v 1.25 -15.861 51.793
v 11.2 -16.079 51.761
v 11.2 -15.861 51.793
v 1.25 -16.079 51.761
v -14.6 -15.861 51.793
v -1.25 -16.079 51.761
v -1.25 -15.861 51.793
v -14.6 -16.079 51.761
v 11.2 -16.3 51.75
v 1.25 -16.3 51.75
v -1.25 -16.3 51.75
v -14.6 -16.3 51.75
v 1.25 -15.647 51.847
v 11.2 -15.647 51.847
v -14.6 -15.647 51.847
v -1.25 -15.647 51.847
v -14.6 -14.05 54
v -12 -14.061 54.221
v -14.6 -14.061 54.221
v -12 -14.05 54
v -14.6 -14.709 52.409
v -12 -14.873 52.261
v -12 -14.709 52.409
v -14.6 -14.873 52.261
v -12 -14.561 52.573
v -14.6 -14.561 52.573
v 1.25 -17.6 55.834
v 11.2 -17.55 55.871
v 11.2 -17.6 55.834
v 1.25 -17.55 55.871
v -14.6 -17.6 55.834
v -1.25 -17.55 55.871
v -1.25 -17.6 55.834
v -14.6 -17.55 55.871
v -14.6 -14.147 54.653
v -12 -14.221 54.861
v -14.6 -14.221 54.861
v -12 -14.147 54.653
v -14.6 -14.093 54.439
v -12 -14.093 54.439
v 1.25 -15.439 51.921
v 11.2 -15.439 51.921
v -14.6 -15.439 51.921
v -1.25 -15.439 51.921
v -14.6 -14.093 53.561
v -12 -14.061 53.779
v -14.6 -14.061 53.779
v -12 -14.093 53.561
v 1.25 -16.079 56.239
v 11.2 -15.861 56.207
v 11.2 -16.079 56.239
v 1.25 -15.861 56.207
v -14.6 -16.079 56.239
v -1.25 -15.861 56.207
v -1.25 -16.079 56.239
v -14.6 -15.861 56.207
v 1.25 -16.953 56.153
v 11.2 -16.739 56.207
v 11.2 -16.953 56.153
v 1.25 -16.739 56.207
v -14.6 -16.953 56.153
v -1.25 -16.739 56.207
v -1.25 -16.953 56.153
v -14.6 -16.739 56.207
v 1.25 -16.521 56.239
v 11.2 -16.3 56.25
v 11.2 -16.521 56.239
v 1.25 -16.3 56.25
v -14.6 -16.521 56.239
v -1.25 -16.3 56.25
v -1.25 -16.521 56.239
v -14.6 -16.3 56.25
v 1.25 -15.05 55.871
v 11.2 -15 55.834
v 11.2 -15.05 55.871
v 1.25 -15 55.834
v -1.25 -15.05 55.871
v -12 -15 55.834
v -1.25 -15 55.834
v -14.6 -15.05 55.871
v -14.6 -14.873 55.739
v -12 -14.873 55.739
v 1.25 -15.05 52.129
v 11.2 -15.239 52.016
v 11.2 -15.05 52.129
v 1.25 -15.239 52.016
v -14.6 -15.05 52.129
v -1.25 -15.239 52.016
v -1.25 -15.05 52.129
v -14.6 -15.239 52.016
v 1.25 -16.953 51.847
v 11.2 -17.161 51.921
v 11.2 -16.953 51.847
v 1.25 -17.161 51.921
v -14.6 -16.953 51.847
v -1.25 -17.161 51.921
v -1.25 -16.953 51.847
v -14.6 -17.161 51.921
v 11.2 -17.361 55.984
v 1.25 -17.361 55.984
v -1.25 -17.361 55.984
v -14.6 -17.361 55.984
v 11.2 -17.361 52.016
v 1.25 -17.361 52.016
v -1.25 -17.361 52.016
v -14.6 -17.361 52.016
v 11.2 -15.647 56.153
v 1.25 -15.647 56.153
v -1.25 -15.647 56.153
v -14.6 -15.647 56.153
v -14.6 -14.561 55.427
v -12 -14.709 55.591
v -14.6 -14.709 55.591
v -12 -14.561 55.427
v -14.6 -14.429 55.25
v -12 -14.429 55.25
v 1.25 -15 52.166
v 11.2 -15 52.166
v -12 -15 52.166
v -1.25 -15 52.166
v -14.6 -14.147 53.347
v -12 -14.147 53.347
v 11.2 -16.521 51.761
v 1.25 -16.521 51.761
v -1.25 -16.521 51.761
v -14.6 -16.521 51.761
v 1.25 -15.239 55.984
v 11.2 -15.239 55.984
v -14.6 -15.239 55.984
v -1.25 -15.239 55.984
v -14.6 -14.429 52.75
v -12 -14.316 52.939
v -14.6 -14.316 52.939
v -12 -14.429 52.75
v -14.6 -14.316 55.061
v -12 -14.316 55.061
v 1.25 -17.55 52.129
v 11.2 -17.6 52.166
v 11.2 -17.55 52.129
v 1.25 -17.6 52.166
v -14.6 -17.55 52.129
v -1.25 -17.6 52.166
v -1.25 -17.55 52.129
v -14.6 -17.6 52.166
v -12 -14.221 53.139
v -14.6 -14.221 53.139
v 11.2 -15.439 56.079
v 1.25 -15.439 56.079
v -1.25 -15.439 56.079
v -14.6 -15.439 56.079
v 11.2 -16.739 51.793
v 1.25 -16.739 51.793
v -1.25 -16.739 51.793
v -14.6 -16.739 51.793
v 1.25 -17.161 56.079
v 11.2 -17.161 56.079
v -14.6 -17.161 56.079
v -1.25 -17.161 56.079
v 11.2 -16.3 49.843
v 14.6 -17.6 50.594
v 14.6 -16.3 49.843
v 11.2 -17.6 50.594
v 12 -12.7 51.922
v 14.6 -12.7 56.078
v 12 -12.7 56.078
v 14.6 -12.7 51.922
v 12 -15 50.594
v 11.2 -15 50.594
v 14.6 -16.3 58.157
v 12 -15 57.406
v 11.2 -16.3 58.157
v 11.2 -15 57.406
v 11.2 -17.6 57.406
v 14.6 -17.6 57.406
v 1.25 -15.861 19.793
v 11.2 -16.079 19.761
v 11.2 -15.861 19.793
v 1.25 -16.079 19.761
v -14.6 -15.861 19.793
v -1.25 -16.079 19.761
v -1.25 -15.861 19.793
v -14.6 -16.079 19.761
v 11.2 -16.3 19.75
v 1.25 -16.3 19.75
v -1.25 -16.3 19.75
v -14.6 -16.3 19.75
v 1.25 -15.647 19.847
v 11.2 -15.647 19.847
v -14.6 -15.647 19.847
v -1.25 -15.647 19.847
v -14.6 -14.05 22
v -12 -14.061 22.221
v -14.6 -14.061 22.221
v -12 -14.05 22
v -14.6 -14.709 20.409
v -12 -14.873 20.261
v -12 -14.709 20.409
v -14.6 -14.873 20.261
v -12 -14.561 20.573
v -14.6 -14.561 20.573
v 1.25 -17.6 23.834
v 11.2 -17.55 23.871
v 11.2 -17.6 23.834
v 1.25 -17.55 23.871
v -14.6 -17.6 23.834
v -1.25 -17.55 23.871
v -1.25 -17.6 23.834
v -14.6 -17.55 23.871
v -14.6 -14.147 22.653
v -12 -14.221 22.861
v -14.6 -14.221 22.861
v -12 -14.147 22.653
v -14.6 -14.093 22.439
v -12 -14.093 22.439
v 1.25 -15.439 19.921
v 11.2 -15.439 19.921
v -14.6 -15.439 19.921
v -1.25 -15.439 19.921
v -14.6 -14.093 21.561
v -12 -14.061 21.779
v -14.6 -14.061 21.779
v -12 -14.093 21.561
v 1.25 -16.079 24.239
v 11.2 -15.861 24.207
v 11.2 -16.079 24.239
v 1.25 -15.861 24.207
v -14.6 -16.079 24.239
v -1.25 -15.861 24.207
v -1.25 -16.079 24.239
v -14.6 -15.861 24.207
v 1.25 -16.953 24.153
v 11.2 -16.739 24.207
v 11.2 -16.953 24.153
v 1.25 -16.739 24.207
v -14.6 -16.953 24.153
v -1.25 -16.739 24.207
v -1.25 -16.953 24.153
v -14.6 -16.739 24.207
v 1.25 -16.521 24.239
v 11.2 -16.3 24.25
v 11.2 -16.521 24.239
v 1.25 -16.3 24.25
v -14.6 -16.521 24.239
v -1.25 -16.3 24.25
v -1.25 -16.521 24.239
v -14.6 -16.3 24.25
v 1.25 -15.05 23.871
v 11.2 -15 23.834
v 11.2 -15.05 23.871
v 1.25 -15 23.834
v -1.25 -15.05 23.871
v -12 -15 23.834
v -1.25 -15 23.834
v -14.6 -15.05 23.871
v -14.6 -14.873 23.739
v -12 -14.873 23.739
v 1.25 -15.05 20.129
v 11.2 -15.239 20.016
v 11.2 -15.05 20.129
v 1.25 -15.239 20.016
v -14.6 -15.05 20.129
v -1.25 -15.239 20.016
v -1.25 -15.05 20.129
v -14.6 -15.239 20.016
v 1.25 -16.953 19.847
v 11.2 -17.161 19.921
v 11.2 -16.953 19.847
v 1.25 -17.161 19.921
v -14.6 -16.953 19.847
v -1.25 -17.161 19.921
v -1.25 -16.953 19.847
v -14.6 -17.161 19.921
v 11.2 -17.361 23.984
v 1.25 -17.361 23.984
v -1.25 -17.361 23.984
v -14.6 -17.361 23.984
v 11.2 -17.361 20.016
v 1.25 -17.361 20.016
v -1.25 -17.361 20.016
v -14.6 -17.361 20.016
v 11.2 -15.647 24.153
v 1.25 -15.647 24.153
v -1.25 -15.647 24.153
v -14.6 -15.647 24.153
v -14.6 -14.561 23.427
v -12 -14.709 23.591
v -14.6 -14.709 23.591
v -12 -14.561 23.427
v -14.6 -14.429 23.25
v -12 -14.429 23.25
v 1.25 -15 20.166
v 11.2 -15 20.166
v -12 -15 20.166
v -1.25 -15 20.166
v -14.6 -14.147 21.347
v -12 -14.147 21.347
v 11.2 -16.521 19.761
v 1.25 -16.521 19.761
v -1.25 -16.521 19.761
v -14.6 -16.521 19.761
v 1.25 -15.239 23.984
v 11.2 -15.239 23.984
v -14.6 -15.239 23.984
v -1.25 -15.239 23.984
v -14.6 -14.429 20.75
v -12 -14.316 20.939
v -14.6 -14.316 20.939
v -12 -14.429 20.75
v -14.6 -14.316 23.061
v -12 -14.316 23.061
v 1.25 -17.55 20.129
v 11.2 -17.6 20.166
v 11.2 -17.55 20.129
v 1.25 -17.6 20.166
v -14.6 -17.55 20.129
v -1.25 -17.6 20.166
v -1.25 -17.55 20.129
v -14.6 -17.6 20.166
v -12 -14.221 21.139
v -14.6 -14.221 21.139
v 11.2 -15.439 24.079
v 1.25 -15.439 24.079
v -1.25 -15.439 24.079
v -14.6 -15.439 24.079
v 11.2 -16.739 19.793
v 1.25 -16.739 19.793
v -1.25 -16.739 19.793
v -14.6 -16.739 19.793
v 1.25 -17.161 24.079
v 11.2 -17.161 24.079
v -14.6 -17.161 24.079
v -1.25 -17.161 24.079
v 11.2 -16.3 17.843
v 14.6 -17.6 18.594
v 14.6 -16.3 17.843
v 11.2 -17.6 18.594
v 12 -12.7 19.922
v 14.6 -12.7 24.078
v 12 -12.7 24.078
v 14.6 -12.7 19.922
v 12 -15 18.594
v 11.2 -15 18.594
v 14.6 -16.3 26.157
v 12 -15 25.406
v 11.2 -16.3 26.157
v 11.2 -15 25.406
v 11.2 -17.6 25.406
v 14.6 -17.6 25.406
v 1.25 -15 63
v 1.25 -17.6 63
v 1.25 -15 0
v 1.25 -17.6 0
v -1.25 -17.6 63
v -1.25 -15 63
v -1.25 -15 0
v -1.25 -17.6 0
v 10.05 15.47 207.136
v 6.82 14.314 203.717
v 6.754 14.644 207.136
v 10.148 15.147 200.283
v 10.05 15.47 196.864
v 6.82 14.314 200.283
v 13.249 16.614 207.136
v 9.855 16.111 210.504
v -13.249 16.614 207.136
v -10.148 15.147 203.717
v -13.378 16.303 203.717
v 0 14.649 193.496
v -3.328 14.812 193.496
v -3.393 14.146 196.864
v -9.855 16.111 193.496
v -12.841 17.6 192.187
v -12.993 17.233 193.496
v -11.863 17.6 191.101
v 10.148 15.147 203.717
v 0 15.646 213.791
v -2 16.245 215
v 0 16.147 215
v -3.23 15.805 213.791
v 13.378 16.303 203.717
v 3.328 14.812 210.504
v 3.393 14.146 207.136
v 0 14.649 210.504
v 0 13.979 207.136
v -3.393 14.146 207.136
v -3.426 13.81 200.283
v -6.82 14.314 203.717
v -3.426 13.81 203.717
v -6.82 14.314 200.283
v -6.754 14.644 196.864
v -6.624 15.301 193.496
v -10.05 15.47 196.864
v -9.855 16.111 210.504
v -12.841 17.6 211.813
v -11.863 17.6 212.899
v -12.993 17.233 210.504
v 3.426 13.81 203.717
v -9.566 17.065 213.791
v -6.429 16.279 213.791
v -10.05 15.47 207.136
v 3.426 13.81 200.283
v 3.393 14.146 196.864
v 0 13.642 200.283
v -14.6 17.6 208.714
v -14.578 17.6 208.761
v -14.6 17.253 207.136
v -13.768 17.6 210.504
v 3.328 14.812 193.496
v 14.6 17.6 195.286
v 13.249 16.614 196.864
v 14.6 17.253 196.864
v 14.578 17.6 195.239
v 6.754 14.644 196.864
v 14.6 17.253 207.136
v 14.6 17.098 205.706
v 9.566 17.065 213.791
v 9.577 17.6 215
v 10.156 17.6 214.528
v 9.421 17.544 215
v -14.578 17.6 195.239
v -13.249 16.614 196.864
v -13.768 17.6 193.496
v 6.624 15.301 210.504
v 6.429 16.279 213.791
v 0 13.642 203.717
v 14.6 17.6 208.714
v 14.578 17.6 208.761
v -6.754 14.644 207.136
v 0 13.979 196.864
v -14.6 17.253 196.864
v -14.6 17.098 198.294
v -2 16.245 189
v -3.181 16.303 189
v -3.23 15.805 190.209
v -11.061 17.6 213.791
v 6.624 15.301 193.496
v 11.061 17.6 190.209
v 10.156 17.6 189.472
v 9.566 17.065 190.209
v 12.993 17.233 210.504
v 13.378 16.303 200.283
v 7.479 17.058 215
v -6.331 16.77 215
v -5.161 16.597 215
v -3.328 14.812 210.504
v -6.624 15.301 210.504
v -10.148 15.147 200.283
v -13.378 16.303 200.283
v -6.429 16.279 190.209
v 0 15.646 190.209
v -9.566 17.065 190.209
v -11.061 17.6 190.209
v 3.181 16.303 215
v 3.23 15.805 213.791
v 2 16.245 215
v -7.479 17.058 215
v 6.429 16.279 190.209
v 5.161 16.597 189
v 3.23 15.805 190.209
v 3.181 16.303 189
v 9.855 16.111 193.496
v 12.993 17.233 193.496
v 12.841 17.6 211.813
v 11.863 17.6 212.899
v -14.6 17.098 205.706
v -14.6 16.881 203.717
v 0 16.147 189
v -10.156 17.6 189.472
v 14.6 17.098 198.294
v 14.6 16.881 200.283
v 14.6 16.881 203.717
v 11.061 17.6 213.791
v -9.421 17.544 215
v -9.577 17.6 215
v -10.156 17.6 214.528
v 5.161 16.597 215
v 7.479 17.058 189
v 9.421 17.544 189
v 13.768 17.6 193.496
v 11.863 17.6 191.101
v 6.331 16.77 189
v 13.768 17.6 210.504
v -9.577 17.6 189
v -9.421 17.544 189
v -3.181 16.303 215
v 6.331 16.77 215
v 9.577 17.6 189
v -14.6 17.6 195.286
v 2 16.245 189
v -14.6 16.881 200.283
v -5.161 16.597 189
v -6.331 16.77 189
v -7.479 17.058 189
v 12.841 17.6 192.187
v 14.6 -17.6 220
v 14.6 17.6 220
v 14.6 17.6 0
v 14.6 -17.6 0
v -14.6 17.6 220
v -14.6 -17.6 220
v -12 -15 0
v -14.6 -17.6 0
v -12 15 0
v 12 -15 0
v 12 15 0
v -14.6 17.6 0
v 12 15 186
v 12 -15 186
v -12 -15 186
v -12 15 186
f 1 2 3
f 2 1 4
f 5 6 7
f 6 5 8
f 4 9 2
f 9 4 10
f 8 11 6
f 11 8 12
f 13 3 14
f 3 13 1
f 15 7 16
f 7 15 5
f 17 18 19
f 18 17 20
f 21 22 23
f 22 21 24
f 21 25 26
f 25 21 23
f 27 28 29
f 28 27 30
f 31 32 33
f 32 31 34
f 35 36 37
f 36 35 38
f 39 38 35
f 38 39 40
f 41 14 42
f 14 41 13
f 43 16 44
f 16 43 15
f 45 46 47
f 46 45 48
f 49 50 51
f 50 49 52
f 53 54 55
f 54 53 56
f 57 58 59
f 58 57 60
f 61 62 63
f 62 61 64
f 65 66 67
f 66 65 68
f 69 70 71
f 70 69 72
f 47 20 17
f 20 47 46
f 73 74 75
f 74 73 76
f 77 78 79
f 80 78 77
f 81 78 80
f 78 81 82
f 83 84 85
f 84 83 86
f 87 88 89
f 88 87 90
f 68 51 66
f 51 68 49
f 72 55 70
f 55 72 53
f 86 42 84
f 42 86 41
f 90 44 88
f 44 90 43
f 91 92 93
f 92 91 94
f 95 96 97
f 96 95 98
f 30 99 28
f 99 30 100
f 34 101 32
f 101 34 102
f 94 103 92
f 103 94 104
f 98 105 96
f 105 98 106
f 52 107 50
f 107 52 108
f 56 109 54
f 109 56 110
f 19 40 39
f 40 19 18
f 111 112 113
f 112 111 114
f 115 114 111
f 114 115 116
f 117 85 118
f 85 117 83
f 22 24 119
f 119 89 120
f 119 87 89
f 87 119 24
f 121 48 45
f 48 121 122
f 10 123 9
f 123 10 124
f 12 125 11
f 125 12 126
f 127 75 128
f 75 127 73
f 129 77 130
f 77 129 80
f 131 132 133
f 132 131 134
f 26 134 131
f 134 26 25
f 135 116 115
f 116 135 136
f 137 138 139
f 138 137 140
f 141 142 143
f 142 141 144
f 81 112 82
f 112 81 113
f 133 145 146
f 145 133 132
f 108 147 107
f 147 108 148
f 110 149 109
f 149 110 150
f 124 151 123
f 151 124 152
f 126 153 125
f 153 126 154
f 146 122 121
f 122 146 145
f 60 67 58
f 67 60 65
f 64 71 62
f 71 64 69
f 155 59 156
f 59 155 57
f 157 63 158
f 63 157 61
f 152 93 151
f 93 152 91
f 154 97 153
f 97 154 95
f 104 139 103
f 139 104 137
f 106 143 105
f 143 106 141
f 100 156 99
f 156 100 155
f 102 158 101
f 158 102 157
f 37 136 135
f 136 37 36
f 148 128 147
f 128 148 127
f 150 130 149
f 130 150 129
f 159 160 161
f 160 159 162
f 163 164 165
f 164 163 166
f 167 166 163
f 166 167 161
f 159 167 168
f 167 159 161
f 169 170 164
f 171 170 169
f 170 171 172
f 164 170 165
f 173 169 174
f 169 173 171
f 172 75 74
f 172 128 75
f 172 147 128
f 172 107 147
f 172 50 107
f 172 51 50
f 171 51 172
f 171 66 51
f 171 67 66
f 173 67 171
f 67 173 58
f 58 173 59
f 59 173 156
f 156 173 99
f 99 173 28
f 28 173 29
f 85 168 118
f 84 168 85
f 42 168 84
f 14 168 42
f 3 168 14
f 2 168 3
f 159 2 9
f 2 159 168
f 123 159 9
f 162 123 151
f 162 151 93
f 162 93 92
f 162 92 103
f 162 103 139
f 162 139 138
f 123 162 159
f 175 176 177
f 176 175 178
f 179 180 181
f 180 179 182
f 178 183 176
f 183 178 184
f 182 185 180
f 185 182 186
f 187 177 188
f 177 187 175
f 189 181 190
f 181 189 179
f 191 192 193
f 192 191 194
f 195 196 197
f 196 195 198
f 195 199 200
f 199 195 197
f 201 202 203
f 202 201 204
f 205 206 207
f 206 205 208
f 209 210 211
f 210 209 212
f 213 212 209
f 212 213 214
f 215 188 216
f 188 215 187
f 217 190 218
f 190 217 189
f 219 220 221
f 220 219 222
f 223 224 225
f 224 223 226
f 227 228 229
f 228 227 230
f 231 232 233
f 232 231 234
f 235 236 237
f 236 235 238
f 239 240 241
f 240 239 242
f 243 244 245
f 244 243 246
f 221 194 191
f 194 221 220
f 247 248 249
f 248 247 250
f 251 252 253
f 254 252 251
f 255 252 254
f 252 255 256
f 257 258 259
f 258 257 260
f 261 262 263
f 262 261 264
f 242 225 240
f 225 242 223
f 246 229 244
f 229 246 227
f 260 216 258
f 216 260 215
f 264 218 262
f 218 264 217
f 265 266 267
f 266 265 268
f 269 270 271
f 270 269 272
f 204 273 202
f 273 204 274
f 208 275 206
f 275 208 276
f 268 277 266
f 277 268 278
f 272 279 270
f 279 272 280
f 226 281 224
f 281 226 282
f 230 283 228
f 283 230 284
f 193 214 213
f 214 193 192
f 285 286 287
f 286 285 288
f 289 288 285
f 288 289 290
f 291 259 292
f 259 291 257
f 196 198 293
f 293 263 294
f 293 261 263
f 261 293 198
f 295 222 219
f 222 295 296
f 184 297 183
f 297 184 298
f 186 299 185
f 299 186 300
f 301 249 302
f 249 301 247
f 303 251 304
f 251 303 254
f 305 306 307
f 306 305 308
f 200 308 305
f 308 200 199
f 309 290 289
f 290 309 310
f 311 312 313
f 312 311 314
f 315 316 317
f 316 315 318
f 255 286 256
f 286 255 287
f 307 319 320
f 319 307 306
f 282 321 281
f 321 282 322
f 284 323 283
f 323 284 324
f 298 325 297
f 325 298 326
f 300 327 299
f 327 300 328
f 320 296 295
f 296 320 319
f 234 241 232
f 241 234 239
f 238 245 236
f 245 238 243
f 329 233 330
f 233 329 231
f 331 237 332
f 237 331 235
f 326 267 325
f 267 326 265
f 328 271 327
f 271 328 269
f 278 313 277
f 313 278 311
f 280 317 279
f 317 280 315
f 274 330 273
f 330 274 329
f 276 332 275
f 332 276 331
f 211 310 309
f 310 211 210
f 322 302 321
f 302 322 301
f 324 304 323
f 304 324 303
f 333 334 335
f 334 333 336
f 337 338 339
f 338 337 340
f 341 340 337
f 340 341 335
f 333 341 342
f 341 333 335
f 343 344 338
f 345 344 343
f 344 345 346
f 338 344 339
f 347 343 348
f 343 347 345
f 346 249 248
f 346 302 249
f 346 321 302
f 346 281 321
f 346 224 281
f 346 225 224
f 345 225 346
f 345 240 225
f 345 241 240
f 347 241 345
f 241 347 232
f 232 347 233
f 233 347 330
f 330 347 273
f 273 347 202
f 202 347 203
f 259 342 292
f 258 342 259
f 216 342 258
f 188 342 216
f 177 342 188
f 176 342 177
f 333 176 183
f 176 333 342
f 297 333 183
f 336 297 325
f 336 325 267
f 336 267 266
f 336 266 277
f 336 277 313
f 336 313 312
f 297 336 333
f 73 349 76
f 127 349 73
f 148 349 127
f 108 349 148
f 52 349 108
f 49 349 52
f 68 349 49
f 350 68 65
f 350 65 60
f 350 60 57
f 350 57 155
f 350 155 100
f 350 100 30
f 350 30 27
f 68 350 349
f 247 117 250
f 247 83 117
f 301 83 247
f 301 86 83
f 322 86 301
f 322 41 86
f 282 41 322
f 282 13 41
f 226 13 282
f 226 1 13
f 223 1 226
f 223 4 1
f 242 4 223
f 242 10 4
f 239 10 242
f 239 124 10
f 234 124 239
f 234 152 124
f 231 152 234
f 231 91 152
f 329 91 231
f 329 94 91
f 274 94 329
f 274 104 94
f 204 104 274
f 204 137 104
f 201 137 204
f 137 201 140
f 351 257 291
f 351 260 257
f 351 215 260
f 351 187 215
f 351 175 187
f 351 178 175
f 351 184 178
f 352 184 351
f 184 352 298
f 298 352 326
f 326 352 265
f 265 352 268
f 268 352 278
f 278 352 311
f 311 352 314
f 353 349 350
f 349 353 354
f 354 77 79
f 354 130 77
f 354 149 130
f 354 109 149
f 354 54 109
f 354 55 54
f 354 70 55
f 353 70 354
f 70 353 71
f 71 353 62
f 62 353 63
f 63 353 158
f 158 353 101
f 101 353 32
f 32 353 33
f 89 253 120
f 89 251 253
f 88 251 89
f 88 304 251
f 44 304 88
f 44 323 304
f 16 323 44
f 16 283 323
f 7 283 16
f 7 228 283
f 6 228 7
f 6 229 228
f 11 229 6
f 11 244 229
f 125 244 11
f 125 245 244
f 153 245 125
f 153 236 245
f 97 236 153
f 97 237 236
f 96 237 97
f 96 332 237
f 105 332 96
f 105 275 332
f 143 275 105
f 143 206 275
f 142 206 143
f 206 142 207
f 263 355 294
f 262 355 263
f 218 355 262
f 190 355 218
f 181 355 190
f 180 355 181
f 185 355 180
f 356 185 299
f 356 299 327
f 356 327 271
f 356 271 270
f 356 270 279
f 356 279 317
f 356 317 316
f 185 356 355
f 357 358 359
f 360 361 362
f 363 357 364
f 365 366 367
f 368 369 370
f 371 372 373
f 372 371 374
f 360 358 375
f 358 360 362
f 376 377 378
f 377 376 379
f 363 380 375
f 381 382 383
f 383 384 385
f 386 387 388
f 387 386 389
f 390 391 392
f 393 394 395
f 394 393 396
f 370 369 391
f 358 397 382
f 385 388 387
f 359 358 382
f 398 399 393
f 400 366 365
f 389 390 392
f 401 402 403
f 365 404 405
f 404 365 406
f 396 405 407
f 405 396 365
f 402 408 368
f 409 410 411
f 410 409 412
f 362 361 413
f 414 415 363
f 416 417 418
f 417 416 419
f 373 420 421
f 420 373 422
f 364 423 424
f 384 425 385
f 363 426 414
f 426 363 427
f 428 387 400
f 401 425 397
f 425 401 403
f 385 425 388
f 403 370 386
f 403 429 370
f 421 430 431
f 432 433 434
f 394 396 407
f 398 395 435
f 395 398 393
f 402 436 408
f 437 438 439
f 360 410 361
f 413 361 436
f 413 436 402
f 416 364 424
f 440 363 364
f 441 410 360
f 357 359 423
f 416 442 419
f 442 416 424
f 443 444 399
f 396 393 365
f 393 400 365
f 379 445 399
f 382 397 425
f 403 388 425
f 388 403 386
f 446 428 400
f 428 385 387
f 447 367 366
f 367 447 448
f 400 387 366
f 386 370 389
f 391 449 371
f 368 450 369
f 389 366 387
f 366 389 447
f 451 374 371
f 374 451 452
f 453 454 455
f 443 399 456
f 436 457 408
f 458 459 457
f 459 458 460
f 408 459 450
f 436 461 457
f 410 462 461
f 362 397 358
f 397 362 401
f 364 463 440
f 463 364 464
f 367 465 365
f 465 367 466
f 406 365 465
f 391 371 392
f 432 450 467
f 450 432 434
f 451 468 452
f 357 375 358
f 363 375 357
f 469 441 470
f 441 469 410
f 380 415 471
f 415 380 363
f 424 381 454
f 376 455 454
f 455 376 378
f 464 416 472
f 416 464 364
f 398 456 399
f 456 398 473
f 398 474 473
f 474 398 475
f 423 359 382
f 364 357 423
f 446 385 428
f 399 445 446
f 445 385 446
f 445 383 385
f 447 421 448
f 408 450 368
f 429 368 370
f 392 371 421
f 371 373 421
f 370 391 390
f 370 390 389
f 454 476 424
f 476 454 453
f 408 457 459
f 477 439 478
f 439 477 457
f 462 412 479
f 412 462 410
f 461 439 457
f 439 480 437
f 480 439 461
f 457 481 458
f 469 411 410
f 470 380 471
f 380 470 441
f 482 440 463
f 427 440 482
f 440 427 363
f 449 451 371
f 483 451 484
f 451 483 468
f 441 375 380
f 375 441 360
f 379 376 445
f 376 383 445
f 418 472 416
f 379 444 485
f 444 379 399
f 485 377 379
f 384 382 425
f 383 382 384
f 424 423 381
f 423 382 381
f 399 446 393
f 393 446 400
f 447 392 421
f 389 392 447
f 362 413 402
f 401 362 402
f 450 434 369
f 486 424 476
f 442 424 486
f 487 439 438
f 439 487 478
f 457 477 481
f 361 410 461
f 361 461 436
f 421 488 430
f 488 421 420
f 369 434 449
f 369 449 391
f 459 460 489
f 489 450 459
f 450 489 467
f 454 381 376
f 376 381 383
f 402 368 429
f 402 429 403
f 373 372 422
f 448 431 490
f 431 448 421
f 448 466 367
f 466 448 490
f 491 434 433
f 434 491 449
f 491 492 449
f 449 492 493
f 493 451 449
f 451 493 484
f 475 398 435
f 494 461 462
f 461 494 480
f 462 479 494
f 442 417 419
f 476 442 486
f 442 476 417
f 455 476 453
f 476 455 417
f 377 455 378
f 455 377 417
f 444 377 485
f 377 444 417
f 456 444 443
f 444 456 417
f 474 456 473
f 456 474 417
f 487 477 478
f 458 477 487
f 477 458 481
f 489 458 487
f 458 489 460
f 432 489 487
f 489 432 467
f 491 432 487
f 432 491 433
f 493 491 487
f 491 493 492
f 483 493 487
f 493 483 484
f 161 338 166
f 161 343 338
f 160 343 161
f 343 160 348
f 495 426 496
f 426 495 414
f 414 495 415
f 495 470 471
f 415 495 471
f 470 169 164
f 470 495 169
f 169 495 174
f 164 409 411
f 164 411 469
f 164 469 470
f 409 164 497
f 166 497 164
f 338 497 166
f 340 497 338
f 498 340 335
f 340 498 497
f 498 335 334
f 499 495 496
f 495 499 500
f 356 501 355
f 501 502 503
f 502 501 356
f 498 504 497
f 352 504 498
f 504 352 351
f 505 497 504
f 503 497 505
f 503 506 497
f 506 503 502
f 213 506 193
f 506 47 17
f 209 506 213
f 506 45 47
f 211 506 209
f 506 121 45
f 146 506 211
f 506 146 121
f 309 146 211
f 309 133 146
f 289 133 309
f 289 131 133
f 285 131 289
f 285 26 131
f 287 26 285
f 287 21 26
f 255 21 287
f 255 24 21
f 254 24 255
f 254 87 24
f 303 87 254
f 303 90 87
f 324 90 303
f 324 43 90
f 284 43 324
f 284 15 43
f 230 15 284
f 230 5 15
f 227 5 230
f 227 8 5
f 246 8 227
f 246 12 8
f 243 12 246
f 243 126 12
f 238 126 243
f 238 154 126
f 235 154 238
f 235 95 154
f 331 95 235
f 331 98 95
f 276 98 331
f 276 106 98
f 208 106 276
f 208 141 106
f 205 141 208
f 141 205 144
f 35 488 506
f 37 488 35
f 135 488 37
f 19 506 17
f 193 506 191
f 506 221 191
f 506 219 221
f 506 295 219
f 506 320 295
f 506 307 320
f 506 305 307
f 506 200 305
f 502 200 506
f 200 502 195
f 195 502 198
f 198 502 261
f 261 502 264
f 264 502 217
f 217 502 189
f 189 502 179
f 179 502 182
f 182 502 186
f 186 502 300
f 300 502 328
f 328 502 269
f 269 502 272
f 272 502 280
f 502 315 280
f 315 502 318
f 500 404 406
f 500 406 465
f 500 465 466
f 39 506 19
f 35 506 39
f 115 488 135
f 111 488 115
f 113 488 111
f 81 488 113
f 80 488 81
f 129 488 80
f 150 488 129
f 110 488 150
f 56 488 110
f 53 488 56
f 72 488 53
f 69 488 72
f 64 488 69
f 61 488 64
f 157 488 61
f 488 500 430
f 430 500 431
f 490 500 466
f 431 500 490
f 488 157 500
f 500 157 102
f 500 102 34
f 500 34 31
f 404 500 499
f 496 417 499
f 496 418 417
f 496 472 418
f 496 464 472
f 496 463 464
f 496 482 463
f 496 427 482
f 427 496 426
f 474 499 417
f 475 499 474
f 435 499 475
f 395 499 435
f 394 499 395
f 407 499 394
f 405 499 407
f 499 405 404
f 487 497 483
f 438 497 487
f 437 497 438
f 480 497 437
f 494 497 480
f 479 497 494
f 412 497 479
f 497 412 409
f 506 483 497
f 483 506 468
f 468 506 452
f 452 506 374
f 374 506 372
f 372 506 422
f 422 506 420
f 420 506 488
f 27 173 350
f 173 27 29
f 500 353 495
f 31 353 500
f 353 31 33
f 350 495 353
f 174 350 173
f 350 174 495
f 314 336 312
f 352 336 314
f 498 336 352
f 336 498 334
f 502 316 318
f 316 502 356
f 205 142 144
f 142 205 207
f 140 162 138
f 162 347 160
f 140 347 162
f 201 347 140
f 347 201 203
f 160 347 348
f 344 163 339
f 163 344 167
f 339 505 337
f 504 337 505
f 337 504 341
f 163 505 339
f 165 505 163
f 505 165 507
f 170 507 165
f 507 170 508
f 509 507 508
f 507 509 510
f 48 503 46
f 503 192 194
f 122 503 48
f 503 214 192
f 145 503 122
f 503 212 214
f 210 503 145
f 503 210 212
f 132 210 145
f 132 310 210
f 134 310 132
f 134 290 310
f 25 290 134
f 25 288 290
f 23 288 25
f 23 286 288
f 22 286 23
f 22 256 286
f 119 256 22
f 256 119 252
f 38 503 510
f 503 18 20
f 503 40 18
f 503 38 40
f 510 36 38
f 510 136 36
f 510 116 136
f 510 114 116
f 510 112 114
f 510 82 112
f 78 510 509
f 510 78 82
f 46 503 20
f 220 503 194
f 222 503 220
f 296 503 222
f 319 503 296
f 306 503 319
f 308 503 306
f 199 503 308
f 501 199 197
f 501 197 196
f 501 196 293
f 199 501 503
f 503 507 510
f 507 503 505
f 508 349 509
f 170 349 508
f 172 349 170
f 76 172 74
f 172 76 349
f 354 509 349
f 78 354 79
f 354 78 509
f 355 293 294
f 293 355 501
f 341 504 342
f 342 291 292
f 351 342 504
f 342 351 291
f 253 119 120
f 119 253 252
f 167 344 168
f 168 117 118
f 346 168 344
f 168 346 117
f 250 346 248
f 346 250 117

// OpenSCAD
// ===================================================================
// Robotiq 2F-85 finger EXTENSION SLEEVE  (slip-on, clamped)
//
// Replaces the earlier bolt-on version, which needed the pad bolt pattern --
// dimensions this project has no authoritative source for. This one slides
// OVER the existing fingertip and pinches with a single cross bolt, so it
// needs no gripper disassembly, tolerates a wrong socket guess, and comes
// straight off again.
//
// PURPOSE (unchanged)
//   1. Put the grasp point 270 mm from the flange, matching
//      throw_pose_table_ext15.npy and results_kinetic_chain_gen3_ext15{,_narrow}/1.
//      run_hardware_throw.py REFUSES a --tool_offset_z that disagrees with the
//      table stamp, so the built number has to be right.
//   2. Break the encompassing grip. Measured 2026-09-09: the bare gripper cages
//      a 67 mm tennis ball until 8.33% closed, so the ball is not free until
//      ~175-250 ms after t_r and then drops onto the gripper. The tip is a
//      SHALLOW DISH -- contact below the ball's equator, so it lifts straight
//      out. Do not deepen it.
//   3. Grip force cannot be limited in software (GRIPPER_FORCE is rejected by
//      this firmware), so the section stays deep in the closing direction.
//
// SOCKET IS OVERSIZED ON PURPOSE. Measure the fingertip, set SOCKET_W/D to
// about +1.5 mm over it, and let the clamp take up the rest. Add a strip of
// rubber inside if it is still loose.
// ===================================================================

/* [Fit -- measure the fingertip, then add ~1.5 mm] */
SOCKET_W   = 24;    // across the finger
SOCKET_D   = 30;    // along the closing direction
SOCKET_L   = 70;    // LONG ON PURPOSE: engagement is adjustable, so the exact
                    // flange-to-fingertip measurement stops being critical.
                    // Slide it on further or less and clamp anywhere over a
                    // ~25 mm range, then MEASURE the resulting grasp point and
                    // set --tool_offset_z / re-derive the pose table to match.
WALL       = 2.6;
TIP_SOLID  = 34;    // solid block at the tip that carries the dish

/* [Length] */
DISH_FROM_FLANGE = 270;  // the number the checkpoint needs, mm
FLANGE_TO_TIP    = 120;  // nominal; the long socket absorbs the error
EXTENSION  = DISH_FROM_FLANGE - FLANGE_TO_TIP;   // sleeve reach past the tip

/* [Clamp] */
SLIT_W     = 2.5;
CLAMP_D    = 4.5;   // M4 clearance
NUT_AF     = 7.2;   // M4 nut across flats
NUT_T      = 3.4;

/* [Tip] */
BALL_D     = 67;
DISH_DEPTH = 4;
DISH_R     = 35;
DISH_L     = 26;

$fn = 64;
OW = SOCKET_W + 2*WALL;
OD = SOCKET_D + 2*WALL;
TOTAL = SOCKET_L + EXTENSION;
DISH_Z = TOTAL - 18;

// STRAIGHT-SIDED TUBE. The first attempt tapered the body via hull(), which
// made the cross-bolt and slit exit through a sloped face and produced a
// non-manifold solid. Straight walls also keep it a real tube: a solid block
// this size would be ~260 g per finger, which the wrist does not need.
module body() {
    translate([-OW/2, -OD/2, 0]) cube([OW, OD, TOTAL]);
}

// Cavity runs the WHOLE length except a solid tip block that carries the dish.
module cavity() {
    translate([-SOCKET_W/2, -SOCKET_D/2, -1])
        cube([SOCKET_W, SOCKET_D, TOTAL - TIP_SOLID + 1]);
}

module clamp() {
    // slit through the outer (-Y) wall so the socket can close on the finger
    translate([-SLIT_W/2, -OD/2 - 1, -1])
        cube([SLIT_W, WALL + 2, SOCKET_L - 6]);
    // TWO cross bolts + captive nuts -- one is not enough to hold a 70 mm
    // socket square against grip load.
    for (z = [SOCKET_L - 16, SOCKET_L - 48])
        translate([0, -(SOCKET_D/2 + WALL/2), z]) rotate([0, 90, 0]) {
            cylinder(d = CLAMP_D, h = OW + 4, center = true);
            translate([0, 0, OW/2 - NUT_T])
                cylinder(d = NUT_AF/cos(30), h = NUT_T + 2, $fn = 6);
        }
}

module dish() {
    intersection() {
        translate([0, OD/2 + DISH_R - DISH_DEPTH, DISH_Z]) sphere(r = DISH_R);
        translate([-OW, OD/2 - DISH_DEPTH, DISH_Z - DISH_L/2])
            cube([2*OW, DISH_DEPTH + 2, DISH_L]);
    }
}

// MIRROR=0 -> right-hand part, MIRROR=1 -> left-hand. The two fingers oppose
// each other, so the dish must face inward on both while the clamp slit stays
// outward -- that is a mirror pair, not one part rotated.
MIRROR = 0;
module sleeve() { difference() { body(); cavity(); clamp(); dish(); } }
if (MIRROR) mirror([0,1,0]) sleeve(); else sleeve();
